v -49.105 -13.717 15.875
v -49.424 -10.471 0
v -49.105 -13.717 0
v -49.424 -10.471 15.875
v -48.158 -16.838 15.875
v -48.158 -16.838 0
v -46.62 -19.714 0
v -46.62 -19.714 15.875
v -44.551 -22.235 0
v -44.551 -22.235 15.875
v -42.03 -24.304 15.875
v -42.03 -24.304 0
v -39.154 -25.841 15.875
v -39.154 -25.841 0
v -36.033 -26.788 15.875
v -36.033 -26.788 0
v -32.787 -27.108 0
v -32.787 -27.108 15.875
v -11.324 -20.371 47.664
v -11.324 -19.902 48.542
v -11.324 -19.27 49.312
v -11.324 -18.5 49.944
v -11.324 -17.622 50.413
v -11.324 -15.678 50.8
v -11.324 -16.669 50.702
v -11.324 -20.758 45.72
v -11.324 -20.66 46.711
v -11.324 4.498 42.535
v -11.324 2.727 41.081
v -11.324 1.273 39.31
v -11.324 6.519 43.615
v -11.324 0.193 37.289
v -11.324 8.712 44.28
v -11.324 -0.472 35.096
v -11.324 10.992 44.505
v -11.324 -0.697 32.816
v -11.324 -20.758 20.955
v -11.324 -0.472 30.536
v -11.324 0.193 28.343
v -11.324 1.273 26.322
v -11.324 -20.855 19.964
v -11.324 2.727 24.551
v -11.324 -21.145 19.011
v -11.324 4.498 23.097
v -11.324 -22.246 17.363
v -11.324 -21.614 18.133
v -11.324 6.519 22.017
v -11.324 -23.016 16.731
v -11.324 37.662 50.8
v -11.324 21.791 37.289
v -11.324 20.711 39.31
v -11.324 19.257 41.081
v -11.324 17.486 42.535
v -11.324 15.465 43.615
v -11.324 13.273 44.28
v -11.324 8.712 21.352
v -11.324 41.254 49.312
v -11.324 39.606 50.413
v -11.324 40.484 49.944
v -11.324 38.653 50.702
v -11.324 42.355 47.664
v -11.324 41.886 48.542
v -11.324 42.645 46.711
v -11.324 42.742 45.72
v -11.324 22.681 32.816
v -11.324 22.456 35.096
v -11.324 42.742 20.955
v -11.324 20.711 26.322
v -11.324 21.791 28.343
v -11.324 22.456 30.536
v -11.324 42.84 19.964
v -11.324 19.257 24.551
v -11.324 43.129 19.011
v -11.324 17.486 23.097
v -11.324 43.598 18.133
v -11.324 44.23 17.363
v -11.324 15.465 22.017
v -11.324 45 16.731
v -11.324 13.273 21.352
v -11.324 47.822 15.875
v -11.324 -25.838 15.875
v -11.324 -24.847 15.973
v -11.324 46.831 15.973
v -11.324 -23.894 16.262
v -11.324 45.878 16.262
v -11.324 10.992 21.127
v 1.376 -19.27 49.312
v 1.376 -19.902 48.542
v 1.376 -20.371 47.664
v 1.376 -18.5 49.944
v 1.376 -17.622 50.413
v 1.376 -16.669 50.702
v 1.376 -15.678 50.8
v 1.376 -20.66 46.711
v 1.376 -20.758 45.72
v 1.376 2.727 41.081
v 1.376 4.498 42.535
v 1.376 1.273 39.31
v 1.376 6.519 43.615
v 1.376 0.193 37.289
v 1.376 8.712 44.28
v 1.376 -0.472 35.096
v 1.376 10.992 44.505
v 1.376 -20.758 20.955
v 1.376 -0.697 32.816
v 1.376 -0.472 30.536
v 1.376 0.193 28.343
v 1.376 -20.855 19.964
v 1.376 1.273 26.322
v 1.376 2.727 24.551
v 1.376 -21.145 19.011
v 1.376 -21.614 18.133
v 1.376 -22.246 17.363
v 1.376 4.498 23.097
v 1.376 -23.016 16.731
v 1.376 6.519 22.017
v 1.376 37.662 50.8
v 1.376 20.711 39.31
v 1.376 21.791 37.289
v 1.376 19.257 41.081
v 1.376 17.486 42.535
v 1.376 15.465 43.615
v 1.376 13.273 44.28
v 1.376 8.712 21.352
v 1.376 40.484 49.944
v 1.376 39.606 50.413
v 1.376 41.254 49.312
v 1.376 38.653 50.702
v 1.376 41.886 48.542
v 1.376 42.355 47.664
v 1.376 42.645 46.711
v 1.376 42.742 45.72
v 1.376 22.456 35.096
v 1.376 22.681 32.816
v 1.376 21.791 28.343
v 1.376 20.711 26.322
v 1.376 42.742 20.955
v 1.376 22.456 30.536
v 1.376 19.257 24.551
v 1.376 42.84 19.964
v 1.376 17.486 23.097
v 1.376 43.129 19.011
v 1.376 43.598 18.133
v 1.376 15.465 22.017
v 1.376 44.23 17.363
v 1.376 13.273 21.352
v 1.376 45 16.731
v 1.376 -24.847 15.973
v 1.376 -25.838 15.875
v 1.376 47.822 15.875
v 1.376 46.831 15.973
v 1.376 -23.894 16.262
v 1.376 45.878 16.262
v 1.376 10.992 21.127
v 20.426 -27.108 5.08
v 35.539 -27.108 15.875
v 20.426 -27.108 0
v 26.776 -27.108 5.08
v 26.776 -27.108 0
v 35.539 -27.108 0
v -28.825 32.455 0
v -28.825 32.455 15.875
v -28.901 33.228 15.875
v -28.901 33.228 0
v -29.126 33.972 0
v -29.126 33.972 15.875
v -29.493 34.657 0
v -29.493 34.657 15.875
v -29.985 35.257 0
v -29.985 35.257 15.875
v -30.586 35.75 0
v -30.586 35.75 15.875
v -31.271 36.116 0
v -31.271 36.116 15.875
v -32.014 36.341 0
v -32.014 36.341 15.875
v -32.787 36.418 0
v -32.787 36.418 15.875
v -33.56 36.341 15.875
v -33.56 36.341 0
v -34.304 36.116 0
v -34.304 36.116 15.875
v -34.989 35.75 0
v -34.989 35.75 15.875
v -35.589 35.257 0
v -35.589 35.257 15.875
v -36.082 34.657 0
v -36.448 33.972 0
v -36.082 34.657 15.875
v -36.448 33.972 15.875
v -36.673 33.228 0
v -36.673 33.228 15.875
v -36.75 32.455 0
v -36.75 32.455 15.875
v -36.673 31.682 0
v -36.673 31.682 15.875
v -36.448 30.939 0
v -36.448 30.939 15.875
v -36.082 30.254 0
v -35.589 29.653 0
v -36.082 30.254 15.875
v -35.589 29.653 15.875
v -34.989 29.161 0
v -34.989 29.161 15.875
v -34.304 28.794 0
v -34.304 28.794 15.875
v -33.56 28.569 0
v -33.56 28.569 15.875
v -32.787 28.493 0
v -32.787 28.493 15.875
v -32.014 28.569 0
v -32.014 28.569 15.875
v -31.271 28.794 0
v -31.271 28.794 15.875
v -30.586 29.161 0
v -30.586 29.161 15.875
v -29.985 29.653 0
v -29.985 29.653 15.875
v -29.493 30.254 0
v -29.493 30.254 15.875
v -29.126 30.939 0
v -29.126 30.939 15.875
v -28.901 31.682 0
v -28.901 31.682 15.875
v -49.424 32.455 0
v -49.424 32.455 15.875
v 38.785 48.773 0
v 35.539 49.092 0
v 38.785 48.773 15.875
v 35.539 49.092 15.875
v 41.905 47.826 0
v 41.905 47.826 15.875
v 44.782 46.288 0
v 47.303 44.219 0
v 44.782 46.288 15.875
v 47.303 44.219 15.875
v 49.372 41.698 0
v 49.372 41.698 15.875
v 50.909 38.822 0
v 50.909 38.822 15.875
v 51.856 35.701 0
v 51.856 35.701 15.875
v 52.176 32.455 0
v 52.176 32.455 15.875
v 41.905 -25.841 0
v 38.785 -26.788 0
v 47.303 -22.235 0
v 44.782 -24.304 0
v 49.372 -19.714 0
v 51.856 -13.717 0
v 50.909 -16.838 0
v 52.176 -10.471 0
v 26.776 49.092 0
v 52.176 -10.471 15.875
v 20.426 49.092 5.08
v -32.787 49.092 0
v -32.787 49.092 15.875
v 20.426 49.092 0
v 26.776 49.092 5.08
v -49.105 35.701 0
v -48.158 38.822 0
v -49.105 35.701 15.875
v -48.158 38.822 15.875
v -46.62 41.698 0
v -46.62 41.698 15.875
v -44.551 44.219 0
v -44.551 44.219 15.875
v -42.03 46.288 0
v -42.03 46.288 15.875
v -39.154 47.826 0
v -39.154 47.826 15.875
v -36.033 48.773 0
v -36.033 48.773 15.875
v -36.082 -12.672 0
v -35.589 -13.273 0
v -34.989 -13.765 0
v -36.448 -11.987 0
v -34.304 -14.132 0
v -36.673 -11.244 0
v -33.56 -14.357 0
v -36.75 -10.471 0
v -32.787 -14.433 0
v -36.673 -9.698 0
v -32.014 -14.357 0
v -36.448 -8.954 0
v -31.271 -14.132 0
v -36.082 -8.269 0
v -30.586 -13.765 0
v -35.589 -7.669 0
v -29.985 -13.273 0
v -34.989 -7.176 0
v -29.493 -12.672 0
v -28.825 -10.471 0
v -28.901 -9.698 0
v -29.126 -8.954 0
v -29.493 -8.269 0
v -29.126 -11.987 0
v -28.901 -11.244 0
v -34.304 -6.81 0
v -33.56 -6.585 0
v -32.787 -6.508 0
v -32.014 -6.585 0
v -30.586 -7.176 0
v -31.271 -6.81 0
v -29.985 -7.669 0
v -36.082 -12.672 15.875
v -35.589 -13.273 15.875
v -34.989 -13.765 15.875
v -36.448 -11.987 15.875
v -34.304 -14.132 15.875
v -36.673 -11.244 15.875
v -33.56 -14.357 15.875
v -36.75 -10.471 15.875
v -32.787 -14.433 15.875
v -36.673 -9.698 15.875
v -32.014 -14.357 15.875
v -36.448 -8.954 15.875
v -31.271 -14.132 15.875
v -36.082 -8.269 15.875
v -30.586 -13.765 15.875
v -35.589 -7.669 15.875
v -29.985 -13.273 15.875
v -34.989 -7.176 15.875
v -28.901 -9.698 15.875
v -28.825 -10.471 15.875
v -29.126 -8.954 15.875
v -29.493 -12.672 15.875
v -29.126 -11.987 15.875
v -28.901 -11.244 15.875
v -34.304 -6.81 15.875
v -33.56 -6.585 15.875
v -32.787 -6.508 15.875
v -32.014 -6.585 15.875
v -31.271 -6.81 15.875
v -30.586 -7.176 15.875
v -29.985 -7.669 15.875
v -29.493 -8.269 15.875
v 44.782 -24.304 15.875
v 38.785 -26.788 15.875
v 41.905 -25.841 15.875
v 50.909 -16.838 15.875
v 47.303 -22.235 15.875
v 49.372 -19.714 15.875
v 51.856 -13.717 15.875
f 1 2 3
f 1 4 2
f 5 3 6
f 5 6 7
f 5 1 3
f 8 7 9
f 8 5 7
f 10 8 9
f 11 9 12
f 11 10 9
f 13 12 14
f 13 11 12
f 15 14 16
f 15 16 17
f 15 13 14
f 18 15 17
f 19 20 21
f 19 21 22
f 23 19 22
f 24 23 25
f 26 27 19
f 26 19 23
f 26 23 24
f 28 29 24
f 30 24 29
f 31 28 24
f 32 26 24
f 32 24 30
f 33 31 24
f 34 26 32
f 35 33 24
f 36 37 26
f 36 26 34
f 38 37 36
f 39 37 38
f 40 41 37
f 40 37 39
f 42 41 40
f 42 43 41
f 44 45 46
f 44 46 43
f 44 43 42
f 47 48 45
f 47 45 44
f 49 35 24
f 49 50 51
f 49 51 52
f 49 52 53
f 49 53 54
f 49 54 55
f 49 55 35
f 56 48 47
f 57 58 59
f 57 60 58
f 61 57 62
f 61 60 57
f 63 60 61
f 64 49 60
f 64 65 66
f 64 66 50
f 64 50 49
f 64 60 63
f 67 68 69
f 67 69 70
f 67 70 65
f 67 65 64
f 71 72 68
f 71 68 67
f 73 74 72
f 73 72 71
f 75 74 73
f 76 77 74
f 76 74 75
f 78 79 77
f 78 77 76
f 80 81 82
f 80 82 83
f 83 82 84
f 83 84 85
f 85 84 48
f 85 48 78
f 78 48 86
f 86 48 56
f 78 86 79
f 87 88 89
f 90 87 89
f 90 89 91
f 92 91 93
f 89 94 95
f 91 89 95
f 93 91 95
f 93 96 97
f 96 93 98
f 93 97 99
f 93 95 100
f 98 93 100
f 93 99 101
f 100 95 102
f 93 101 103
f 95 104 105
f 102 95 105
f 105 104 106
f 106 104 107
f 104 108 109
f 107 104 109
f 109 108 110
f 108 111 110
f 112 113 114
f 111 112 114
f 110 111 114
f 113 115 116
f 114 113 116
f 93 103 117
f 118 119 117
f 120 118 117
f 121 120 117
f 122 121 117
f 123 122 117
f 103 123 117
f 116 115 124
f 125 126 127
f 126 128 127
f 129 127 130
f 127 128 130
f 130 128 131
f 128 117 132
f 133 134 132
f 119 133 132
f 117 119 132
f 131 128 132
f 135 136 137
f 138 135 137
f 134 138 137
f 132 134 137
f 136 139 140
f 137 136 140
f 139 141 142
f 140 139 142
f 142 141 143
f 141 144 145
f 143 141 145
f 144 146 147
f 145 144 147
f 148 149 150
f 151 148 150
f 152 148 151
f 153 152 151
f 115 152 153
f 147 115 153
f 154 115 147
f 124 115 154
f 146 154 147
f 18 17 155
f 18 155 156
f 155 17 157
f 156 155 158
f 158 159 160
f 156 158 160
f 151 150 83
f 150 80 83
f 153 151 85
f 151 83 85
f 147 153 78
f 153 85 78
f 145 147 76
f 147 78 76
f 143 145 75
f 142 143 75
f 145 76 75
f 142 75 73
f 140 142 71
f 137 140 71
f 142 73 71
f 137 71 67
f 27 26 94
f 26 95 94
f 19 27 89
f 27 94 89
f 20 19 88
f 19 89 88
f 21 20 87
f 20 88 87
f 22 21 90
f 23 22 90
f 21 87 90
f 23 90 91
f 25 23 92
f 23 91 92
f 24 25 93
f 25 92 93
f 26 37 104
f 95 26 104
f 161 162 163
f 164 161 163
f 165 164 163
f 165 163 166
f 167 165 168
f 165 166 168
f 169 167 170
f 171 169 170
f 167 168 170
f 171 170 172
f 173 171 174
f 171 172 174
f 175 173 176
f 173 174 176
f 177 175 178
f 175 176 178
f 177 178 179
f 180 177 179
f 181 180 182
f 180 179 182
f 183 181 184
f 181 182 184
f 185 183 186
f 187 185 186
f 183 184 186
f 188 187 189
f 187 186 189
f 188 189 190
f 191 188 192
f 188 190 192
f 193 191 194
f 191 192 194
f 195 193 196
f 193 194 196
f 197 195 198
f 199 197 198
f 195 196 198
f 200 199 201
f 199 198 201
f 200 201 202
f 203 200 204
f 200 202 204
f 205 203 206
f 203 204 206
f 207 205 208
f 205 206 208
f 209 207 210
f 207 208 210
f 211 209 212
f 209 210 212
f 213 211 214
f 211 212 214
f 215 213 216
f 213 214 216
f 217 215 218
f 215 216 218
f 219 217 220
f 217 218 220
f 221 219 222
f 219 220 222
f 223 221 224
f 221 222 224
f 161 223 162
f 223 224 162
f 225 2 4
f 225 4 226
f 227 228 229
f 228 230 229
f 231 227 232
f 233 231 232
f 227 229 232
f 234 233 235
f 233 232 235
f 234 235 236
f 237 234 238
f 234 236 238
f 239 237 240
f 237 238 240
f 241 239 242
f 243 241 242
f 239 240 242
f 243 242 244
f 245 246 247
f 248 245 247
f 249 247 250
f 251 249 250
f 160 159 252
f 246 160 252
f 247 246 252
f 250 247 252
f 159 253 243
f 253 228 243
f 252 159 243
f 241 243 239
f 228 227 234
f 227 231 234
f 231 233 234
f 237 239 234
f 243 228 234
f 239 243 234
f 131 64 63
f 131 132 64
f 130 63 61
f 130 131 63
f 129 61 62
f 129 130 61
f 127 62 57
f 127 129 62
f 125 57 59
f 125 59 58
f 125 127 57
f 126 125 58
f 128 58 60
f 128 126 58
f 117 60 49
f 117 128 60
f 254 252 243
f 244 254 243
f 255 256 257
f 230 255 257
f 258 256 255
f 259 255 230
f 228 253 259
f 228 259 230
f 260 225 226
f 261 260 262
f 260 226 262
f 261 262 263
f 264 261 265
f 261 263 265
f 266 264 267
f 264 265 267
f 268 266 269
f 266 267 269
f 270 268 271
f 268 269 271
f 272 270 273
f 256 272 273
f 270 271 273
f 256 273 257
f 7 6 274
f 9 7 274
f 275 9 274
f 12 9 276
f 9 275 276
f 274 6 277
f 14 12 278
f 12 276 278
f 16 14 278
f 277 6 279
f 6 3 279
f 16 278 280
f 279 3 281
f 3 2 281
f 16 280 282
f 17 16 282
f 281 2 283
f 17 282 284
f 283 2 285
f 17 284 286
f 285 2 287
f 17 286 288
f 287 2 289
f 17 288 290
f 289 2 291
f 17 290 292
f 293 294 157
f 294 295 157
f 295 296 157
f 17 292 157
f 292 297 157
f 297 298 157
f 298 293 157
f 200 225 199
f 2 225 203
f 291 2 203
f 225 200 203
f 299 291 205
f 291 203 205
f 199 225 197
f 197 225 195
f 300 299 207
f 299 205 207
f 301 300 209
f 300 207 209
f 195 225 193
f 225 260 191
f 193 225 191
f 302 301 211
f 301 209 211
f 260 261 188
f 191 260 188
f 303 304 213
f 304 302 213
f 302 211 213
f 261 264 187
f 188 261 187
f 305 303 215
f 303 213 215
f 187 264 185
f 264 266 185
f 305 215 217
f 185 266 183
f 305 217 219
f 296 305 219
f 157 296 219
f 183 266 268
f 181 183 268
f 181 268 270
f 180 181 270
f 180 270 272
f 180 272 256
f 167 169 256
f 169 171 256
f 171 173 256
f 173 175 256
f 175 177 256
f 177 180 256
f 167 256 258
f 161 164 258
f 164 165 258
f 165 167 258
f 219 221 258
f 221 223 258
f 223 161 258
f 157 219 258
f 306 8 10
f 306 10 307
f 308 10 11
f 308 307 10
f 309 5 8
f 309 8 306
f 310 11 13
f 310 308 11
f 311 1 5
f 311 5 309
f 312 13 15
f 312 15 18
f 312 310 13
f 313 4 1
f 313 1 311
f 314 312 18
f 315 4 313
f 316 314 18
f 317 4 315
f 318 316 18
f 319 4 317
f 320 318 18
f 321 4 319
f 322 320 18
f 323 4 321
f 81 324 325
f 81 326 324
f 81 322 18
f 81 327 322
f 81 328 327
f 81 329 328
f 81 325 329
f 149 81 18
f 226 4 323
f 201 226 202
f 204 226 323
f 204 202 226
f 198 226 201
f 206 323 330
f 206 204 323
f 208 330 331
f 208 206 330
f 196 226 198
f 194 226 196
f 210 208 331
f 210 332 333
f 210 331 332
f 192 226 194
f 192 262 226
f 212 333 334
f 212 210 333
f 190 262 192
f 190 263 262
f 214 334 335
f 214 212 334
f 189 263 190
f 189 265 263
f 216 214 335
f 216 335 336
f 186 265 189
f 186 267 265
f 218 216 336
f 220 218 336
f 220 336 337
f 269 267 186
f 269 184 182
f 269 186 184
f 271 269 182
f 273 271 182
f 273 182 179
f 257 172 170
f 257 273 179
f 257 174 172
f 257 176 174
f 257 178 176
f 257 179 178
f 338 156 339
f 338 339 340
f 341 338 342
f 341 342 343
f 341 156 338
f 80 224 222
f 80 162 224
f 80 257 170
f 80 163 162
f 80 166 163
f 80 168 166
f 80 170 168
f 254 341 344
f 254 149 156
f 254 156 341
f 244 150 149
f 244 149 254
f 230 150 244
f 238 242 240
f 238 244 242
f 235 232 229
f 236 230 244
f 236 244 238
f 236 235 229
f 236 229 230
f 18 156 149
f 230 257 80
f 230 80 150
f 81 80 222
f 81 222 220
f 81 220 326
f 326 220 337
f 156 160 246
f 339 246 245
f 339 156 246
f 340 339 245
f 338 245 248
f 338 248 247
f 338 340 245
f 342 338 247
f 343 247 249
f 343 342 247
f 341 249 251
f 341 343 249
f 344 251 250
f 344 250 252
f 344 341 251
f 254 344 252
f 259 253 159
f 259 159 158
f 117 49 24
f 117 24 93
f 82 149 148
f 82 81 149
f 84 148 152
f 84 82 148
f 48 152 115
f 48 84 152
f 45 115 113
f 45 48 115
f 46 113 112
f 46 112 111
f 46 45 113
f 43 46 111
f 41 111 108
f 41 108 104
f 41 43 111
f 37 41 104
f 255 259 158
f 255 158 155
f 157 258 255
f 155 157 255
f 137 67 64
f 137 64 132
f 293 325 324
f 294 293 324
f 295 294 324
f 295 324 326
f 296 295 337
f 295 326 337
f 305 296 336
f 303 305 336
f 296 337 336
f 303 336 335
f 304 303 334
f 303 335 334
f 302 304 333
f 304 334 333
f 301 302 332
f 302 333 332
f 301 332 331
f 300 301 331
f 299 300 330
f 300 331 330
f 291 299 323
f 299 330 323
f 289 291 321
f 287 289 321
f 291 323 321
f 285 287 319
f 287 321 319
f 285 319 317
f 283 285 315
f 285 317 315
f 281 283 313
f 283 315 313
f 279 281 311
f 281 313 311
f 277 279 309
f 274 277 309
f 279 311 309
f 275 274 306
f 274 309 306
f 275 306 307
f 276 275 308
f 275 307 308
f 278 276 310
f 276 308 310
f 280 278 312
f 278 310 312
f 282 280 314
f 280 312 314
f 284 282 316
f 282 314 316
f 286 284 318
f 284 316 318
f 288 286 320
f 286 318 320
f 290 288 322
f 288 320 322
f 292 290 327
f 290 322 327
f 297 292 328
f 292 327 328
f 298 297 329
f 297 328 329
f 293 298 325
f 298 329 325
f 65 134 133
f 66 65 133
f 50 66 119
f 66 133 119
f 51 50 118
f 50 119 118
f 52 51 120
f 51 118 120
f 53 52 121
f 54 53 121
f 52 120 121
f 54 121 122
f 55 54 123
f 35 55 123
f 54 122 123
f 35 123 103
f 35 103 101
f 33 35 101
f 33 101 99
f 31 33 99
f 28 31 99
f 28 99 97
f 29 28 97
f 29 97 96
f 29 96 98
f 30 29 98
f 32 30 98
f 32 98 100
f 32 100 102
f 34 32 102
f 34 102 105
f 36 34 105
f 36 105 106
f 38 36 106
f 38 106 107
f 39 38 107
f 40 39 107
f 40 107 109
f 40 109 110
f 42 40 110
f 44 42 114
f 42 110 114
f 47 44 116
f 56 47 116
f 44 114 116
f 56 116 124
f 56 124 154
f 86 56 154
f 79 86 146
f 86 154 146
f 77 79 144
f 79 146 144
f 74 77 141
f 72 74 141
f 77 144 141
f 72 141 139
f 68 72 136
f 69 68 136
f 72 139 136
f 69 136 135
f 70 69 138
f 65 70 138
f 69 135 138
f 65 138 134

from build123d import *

# Parameters (mm, degrees)
F0_W      = 101.6
F0_H      = 76.2
F1_DEPTH  = 15.875
F2_R      = 3.9624
F3_DEPTH  = 15.875
F4_R      = 16.637
F5_W      = 12.7
F5_H      = 63.5
F6_DEPTH  = 50.8
F7_R      = 5.08
F8_R      = 11.688691
F9_DEPTH  = 25.4
F10_W     = 6.35
F10_H     = 5.08
F11_DEPTH = 101.6


with BuildPart() as f1:
    # F0 (on Top) → F1 (new body)
    with BuildSketch(Plane.XY):
        with Locations((1.375794, 10.99218)):
            Rectangle(F0_W, F0_H)
    extrude(amount=F1_DEPTH)

    # F2 (on face) → F3 (cut)
    with BuildSketch(Plane.XY.offset(15.875)):
        with Locations((-32.787206, 32.45518)):
            Circle(F2_R)
        with Locations((-32.787206, -10.47082)):
            Circle(F2_R)
    extrude(amount=-F3_DEPTH, mode=Mode.SUBTRACT)

    # F4
    f4_edges = [f1.edges().sort_by_distance(p)[0] for p in [
        (-49.424206, 49.09218, 7.9375),
        (52.175794, 49.09218, 7.9375),
        (52.175794, -27.10782, 7.9375),
        (-49.424206, -27.10782, 7.9375),
    ]]
    fillet(f4_edges, radius=F4_R)

    # F5 (on Top) → F6 (join)
    with BuildSketch(Plane.XY):
        with Locations((-4.974206, 10.99218)):
            Rectangle(F5_W, F5_H)
    extrude(amount=F6_DEPTH)

    # F7
    f7_edges = [f1.edges().sort_by_distance(p)[0] for p in [
        (-4.974206, 42.74218, 50.8),
        (-4.974206, -20.75782, 50.8),
        (-4.974206, -20.75782, 15.875),
        (-4.974206, 42.74218, 15.875),
    ]]
    fillet(f7_edges, radius=F7_R)

    # F8 (on face) → F9 (cut)
    with BuildSketch(Plane.YZ.offset(1.375794)):
        with Locations((10.99218, 32.816)):
            Circle(F8_R)
    extrude(amount=-F9_DEPTH, mode=Mode.SUBTRACT)

    # F10 (on face) → F11 (cut)
    with BuildSketch(Plane(origin=(0, 49.09218, 0), x_dir=(-1, 0, 0), z_dir=(0, 1, 0))):
        with Locations((-23.600794, 2.54)):
            Rectangle(F10_W, F10_H)
    extrude(amount=-F11_DEPTH, mode=Mode.SUBTRACT)


solid = f1.part
